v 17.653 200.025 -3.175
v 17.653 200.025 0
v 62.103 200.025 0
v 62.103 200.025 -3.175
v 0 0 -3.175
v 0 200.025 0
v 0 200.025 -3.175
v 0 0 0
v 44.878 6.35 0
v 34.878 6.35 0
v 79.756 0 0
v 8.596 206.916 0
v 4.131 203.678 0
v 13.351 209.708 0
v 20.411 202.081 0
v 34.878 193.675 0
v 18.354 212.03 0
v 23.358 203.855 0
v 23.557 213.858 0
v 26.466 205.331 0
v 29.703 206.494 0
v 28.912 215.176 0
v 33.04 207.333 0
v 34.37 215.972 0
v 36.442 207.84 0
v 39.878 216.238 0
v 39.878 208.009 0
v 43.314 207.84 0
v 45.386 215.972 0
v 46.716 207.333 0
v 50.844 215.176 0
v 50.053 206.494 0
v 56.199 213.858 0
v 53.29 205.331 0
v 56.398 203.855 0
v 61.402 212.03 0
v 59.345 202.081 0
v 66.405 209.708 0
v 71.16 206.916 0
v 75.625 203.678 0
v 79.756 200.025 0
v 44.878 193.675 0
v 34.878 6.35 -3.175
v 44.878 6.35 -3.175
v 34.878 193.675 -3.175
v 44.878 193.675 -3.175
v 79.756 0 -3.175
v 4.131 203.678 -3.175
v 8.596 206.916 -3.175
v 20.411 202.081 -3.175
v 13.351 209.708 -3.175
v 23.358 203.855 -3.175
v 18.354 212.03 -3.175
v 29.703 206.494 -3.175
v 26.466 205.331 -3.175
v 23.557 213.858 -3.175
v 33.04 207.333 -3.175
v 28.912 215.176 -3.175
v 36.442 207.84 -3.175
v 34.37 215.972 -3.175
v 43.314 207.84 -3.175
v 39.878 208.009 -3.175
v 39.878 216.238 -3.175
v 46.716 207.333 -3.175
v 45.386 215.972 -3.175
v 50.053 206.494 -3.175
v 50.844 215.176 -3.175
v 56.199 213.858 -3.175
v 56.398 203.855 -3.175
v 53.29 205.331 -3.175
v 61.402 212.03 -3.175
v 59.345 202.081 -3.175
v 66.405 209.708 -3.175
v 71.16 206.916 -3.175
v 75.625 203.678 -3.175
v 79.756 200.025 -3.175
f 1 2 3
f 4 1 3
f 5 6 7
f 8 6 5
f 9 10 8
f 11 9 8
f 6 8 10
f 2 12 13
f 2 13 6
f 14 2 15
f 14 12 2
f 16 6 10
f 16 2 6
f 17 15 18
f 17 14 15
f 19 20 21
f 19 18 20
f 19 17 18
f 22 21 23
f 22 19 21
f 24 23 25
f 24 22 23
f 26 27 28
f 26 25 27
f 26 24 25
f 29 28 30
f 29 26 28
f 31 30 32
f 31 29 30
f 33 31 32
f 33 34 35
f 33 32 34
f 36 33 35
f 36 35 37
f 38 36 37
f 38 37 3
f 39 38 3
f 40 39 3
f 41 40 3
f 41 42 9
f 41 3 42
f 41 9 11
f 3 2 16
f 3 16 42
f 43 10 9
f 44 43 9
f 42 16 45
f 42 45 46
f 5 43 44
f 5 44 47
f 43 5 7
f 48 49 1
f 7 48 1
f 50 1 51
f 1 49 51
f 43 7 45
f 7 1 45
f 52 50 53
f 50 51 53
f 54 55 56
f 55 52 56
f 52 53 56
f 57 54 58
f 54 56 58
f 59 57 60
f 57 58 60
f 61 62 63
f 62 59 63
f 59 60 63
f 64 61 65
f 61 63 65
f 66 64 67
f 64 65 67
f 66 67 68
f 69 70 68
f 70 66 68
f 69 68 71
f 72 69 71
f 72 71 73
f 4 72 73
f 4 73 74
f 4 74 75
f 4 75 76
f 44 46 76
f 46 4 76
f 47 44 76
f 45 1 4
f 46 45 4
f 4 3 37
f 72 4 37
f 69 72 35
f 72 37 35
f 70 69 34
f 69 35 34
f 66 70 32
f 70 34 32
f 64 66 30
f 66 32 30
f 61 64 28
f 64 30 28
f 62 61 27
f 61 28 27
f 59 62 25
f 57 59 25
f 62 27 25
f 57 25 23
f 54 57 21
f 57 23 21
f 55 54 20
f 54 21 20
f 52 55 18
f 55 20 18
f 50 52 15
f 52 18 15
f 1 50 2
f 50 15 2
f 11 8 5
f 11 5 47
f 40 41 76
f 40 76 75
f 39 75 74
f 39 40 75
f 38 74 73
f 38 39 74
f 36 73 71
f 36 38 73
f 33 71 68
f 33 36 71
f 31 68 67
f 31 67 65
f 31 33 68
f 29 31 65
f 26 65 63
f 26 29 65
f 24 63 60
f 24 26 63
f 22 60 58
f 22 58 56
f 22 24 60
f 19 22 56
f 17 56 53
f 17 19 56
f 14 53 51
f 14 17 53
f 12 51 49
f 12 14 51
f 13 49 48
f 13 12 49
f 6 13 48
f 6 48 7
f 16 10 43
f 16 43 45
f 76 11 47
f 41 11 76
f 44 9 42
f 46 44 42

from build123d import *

# Parameters (mm, degrees)
SKETCH1_W           = 10
SKETCH1_H           = 187.325
BOSS_EXTRUDE1_DEPTH = 3.175


with BuildPart() as part:
    # Sketch1 → Boss-Extrude1 (new body)
    with BuildSketch(Plane.XY):
        with BuildLine():
            Line((0, 0), (79.756, 0))
            Line((79.756, 0), (79.756, 200.025))
            ThreePointArc((79.756, 200.025), (39.878, 216.237637896), (0, 200.025))
            Line((0, 200.025), (0, 0))
        make_face()
        with BuildLine():
            Line((17.653, 200.025), (62.103, 200.025))
            ThreePointArc((62.103, 200.025), (39.878, 208.009231637), (17.653, 200.025))
        make_face(mode=Mode.SUBTRACT)
        with Locations((39.878, 100.0125)):
            Rectangle(SKETCH1_W, SKETCH1_H, mode=Mode.SUBTRACT)
    extrude(amount=-BOSS_EXTRUDE1_DEPTH)


solid = part.part
